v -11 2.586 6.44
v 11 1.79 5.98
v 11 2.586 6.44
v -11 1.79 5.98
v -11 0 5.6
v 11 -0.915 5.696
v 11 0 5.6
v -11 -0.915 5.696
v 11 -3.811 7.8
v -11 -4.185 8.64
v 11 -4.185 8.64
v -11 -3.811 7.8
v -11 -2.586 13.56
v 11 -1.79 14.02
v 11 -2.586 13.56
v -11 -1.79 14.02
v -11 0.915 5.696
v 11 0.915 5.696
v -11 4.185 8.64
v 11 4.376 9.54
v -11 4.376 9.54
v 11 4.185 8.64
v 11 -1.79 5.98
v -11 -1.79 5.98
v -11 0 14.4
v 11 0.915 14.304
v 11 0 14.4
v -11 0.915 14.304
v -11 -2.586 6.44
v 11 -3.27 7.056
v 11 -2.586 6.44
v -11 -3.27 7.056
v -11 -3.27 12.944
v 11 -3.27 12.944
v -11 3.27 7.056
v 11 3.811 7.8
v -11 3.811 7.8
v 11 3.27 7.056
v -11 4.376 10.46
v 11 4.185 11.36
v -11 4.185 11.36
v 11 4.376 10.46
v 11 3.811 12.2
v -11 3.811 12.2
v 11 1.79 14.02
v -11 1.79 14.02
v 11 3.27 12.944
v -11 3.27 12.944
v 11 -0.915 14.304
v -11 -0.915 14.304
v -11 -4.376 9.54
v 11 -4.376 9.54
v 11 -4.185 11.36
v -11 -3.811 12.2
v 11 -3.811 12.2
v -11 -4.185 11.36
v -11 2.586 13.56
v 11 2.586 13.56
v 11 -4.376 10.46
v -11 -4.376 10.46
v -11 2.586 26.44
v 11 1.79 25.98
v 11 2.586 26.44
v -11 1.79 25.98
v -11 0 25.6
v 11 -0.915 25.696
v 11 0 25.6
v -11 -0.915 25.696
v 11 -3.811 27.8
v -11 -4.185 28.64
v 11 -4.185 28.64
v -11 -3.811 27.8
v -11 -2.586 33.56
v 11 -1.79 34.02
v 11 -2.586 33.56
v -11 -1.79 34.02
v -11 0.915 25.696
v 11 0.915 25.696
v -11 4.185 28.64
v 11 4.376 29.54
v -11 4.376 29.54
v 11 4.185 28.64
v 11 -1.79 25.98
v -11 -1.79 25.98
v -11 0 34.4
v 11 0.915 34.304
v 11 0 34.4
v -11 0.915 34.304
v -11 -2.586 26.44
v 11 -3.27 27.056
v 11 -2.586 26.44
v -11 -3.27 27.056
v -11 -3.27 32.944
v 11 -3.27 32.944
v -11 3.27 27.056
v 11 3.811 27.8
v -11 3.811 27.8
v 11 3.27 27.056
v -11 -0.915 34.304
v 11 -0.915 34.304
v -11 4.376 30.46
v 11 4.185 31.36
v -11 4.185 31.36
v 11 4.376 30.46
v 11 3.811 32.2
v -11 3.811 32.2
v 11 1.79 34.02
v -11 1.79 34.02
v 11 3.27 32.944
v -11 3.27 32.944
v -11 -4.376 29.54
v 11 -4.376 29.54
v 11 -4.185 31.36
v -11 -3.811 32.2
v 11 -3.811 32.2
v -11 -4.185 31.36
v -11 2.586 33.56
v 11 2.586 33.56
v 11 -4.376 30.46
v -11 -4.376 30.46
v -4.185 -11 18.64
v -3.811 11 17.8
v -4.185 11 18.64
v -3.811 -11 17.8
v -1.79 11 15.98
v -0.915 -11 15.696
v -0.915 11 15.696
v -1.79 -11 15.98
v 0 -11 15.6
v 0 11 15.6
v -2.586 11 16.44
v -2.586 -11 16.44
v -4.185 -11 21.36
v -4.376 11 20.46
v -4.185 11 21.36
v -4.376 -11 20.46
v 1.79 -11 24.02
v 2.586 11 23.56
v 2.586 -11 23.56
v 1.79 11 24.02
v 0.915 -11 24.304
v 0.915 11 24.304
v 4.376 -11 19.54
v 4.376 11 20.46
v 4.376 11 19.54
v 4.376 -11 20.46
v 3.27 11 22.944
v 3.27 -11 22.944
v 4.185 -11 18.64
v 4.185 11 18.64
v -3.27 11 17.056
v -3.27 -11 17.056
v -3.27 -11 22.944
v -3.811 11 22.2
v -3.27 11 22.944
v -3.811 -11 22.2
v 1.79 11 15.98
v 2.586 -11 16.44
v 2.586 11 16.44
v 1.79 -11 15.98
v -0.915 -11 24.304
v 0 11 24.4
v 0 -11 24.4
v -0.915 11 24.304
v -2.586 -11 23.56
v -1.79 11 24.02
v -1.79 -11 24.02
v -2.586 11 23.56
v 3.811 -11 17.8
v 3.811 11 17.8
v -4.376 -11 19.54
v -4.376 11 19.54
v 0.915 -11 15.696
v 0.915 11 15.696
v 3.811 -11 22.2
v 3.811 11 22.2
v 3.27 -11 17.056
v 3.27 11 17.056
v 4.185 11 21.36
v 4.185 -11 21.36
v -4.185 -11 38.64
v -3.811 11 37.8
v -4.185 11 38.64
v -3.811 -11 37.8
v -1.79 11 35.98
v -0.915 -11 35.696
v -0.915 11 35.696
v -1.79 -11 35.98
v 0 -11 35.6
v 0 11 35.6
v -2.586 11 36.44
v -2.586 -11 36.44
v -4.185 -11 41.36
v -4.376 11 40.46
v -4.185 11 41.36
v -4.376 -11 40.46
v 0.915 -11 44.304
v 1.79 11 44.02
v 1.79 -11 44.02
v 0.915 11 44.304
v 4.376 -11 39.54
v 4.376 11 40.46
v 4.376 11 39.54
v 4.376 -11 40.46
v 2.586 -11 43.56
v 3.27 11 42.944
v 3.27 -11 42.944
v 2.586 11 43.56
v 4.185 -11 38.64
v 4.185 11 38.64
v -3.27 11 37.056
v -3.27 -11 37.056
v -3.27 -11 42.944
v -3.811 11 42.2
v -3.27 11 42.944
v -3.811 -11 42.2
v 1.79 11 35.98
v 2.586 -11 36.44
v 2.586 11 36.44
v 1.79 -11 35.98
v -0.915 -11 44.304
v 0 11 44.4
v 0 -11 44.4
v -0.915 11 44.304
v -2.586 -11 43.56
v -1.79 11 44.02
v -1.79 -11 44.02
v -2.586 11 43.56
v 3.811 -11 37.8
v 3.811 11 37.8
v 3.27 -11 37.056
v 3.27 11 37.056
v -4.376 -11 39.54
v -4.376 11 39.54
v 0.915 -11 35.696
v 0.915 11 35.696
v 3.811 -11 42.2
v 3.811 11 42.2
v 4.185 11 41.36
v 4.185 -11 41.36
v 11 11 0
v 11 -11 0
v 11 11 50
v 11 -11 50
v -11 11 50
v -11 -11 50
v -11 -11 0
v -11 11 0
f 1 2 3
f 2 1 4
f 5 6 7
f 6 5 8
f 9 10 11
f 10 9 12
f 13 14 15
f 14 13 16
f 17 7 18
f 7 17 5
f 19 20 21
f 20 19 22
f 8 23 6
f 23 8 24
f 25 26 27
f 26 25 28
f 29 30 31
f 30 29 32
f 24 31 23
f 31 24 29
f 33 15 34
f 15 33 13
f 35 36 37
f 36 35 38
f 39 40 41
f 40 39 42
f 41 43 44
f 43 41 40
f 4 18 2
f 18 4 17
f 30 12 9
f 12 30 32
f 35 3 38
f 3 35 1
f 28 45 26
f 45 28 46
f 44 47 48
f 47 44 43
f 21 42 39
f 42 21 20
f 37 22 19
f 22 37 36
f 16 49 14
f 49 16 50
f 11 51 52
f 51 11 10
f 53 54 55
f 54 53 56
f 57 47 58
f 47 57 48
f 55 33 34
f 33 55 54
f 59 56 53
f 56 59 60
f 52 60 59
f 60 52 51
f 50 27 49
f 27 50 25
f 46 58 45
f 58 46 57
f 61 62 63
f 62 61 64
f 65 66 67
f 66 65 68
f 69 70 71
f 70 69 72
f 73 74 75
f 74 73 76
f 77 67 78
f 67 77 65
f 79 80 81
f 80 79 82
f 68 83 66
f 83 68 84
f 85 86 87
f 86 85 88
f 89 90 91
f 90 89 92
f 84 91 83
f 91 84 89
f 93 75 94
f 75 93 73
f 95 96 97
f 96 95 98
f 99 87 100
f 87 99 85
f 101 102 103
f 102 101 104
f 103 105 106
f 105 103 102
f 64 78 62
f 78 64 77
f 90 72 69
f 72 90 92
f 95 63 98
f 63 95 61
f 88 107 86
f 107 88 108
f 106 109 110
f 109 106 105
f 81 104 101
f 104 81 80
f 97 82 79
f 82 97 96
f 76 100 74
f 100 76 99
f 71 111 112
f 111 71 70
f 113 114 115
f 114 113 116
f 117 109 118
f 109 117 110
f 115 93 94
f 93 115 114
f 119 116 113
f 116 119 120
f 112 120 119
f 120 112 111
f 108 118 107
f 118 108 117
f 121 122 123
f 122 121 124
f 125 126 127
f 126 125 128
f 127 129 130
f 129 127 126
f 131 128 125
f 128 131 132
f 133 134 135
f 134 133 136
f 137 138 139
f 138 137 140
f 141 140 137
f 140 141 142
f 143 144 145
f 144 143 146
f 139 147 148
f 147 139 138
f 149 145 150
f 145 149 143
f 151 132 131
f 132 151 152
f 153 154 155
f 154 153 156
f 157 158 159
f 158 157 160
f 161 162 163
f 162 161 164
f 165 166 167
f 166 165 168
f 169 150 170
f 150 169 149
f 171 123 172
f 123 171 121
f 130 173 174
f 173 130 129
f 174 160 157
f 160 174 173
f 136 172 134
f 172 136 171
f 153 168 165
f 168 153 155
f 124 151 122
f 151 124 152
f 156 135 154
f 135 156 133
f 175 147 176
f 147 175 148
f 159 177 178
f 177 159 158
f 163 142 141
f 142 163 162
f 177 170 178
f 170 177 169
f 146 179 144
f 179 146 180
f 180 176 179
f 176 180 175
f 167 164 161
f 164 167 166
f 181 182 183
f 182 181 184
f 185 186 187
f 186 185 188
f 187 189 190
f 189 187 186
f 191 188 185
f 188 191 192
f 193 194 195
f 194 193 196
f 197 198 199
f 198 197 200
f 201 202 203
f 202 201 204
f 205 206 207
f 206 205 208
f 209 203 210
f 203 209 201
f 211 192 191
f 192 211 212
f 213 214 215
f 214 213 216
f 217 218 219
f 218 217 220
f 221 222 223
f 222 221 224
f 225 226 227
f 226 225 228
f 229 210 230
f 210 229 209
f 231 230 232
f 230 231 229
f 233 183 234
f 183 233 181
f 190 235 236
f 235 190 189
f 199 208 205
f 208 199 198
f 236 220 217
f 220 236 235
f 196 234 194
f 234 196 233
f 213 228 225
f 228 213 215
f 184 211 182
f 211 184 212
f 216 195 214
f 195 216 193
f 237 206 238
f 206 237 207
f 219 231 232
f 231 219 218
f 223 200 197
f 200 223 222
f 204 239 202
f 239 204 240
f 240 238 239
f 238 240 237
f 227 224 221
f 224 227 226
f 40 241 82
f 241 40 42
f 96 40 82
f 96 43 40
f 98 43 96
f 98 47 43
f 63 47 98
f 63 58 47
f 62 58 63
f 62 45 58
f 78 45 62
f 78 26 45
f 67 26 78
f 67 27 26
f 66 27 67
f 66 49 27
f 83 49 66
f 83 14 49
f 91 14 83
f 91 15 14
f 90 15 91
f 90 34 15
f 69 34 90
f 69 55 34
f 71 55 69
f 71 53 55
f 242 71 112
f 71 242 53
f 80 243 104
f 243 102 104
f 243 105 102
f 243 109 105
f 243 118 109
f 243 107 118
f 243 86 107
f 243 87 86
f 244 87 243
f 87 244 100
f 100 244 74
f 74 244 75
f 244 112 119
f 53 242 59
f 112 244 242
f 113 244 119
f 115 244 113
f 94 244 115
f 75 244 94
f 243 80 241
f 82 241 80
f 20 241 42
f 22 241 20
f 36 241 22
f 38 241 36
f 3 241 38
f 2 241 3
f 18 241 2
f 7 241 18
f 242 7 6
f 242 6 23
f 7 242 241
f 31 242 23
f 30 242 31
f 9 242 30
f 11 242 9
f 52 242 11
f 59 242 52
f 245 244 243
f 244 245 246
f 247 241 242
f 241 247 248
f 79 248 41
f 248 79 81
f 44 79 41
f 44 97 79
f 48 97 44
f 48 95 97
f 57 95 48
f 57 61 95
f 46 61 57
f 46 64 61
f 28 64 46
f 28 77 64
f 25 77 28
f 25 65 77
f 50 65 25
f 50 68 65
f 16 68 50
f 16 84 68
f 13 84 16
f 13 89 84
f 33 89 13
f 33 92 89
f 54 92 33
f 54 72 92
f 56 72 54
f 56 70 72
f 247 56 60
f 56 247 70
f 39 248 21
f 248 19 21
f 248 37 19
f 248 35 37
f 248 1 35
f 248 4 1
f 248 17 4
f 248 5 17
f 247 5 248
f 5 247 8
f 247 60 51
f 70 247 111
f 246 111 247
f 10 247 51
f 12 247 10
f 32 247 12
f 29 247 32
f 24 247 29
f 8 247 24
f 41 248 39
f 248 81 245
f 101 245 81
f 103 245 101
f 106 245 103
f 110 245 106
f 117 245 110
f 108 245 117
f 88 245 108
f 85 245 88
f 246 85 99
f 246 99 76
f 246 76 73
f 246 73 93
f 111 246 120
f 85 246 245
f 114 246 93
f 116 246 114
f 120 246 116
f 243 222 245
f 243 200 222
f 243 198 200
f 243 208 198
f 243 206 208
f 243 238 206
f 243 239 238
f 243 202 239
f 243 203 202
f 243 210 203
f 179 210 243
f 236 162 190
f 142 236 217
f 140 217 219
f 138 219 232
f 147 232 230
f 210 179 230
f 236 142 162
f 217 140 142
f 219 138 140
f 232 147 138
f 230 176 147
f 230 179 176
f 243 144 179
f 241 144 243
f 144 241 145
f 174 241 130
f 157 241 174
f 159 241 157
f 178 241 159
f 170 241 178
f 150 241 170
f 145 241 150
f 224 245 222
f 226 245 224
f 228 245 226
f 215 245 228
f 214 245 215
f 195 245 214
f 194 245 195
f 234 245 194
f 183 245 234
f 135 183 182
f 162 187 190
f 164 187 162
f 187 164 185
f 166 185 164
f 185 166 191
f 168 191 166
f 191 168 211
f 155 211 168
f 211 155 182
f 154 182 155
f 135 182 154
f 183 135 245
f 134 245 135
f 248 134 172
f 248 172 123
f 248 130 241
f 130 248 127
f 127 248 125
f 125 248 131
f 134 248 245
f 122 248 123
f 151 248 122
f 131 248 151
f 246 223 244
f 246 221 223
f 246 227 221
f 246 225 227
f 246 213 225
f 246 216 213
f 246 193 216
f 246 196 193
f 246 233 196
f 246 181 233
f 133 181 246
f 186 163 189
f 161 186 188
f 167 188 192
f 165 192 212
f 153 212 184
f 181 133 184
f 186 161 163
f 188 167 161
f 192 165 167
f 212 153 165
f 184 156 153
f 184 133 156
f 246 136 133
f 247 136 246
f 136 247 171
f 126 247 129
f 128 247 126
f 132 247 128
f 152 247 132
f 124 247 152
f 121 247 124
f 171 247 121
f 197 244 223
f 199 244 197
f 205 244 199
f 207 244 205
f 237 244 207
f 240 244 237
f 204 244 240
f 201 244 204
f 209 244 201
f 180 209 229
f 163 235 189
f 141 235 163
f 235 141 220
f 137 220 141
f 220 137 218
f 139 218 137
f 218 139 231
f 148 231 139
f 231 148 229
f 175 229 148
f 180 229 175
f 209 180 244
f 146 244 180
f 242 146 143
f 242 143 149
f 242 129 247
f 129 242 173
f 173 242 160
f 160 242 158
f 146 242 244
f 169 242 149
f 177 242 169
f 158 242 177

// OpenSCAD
module corner_base(){	

 translate([-11,-11,0])cube([22,22,50]);
}

module corner_holes(){
 translate([-11,-11,0]){
  // Bottom hole
  translate([0,11,10]) rotate([0,90,0]) translate([0,0,-5]) cylinder(h = 270, r=4.4, $fn=30);
  // Top hole
  translate([0,11,30]) rotate([0,90,0]) translate([0,0,-5]) cylinder(h = 270, r=4.4, $fn=30);
  // Middle hole
 translate([11,0,20]) rotate([0,0,90]) rotate([0,90,0]) translate([0,0,-100]) cylinder(h = 270, r=4.4, $fn=30);
//TopTop hole
 translate([11,0,40]) rotate([0,0,90]) rotate([0,90,0]) translate([0,0,-100]) cylinder(h = 270, r=4.4, $fn=30);

// Top hole
  translate([5.4*2,-22/2,20+5.4*2+1]) rotate([0,0,0]) cylinder(h = 270, r=5.4, $fn=30);

  translate([0,33,55]) rotate([90,90,90]) cylinder(h = 270, r=4.2);


 }
}

// Final part
module corner(){

 // Rotate the part for better printing
 difference(){
  union(){
   corner_base();

  }
  corner_holes();

 }
}

corner();
